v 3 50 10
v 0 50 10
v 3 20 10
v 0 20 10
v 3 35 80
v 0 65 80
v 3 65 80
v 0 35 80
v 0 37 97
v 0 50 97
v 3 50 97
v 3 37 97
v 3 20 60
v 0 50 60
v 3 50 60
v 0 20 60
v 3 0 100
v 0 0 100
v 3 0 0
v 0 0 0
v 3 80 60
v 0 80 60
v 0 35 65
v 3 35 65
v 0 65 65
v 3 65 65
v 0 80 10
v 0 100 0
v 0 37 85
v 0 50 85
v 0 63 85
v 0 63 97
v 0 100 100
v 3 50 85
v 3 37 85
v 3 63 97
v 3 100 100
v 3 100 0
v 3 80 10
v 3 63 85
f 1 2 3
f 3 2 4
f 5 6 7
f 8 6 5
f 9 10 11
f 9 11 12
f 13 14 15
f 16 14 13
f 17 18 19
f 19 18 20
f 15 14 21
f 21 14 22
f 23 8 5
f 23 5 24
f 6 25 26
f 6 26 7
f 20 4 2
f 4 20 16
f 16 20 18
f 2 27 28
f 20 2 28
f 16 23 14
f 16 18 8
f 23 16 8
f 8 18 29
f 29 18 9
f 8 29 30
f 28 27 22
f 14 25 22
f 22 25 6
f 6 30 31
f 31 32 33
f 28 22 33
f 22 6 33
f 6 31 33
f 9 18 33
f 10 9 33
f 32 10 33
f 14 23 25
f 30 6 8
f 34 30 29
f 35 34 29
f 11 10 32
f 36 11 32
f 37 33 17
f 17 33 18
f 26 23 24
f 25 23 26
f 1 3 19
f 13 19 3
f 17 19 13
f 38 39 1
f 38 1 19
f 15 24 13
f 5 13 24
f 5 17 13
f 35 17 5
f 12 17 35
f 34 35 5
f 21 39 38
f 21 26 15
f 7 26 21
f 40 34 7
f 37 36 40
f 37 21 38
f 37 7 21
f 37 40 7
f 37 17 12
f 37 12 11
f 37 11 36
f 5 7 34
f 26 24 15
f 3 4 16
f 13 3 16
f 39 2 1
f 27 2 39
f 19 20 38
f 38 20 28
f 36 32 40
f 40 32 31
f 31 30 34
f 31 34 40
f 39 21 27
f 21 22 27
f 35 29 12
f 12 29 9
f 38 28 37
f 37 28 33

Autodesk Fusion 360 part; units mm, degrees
sketch "Sketch1" plane through (0, 0, 0) normal (1, 0, 0) x (0, 1, 0)
  line L0 (0, 0) -> (100, 0)
  line L1 (100, 0) -> (100, 100)
  line L2 (100, 100) -> (0, 100)
  line L3 (0, 100) -> (0, 0)
  line L4 (50, 10) -> (80, 10)
  line L5 (50, 60) -> (20, 60)
  line L6 (20, 60) -> (80, 60)
  line L7 (80, 60) -> (80, 10)
  line L8 (80, 10) -> (20, 10)
  line L9 (20, 10) -> (20, 60)
  line L10 (35, 65) -> (65, 65)
  line L11 (65, 65) -> (65, 80)
  line L12 (65, 80) -> (35, 80)
  line L13 (35, 80) -> (35, 65)
  line L14 (50, 85) -> (63, 85)
  line L15 (50, 97) -> (37, 97)
  line L16 (37, 97) -> (63, 97)
  line L17 (63, 97) -> (63, 85)
  line L18 (63, 85) -> (37, 85)
  line L19 (37, 85) -> (37, 97)
  dimension "d1" = 100
  dimension "d2" = 100
  dimension "d4" = 30
  dimension "d5" = 13
  dimension "d6" = 12
  dimension "d7" = 13
extrude "Extrude1" add sketch "Sketch1" along normal blind 3
